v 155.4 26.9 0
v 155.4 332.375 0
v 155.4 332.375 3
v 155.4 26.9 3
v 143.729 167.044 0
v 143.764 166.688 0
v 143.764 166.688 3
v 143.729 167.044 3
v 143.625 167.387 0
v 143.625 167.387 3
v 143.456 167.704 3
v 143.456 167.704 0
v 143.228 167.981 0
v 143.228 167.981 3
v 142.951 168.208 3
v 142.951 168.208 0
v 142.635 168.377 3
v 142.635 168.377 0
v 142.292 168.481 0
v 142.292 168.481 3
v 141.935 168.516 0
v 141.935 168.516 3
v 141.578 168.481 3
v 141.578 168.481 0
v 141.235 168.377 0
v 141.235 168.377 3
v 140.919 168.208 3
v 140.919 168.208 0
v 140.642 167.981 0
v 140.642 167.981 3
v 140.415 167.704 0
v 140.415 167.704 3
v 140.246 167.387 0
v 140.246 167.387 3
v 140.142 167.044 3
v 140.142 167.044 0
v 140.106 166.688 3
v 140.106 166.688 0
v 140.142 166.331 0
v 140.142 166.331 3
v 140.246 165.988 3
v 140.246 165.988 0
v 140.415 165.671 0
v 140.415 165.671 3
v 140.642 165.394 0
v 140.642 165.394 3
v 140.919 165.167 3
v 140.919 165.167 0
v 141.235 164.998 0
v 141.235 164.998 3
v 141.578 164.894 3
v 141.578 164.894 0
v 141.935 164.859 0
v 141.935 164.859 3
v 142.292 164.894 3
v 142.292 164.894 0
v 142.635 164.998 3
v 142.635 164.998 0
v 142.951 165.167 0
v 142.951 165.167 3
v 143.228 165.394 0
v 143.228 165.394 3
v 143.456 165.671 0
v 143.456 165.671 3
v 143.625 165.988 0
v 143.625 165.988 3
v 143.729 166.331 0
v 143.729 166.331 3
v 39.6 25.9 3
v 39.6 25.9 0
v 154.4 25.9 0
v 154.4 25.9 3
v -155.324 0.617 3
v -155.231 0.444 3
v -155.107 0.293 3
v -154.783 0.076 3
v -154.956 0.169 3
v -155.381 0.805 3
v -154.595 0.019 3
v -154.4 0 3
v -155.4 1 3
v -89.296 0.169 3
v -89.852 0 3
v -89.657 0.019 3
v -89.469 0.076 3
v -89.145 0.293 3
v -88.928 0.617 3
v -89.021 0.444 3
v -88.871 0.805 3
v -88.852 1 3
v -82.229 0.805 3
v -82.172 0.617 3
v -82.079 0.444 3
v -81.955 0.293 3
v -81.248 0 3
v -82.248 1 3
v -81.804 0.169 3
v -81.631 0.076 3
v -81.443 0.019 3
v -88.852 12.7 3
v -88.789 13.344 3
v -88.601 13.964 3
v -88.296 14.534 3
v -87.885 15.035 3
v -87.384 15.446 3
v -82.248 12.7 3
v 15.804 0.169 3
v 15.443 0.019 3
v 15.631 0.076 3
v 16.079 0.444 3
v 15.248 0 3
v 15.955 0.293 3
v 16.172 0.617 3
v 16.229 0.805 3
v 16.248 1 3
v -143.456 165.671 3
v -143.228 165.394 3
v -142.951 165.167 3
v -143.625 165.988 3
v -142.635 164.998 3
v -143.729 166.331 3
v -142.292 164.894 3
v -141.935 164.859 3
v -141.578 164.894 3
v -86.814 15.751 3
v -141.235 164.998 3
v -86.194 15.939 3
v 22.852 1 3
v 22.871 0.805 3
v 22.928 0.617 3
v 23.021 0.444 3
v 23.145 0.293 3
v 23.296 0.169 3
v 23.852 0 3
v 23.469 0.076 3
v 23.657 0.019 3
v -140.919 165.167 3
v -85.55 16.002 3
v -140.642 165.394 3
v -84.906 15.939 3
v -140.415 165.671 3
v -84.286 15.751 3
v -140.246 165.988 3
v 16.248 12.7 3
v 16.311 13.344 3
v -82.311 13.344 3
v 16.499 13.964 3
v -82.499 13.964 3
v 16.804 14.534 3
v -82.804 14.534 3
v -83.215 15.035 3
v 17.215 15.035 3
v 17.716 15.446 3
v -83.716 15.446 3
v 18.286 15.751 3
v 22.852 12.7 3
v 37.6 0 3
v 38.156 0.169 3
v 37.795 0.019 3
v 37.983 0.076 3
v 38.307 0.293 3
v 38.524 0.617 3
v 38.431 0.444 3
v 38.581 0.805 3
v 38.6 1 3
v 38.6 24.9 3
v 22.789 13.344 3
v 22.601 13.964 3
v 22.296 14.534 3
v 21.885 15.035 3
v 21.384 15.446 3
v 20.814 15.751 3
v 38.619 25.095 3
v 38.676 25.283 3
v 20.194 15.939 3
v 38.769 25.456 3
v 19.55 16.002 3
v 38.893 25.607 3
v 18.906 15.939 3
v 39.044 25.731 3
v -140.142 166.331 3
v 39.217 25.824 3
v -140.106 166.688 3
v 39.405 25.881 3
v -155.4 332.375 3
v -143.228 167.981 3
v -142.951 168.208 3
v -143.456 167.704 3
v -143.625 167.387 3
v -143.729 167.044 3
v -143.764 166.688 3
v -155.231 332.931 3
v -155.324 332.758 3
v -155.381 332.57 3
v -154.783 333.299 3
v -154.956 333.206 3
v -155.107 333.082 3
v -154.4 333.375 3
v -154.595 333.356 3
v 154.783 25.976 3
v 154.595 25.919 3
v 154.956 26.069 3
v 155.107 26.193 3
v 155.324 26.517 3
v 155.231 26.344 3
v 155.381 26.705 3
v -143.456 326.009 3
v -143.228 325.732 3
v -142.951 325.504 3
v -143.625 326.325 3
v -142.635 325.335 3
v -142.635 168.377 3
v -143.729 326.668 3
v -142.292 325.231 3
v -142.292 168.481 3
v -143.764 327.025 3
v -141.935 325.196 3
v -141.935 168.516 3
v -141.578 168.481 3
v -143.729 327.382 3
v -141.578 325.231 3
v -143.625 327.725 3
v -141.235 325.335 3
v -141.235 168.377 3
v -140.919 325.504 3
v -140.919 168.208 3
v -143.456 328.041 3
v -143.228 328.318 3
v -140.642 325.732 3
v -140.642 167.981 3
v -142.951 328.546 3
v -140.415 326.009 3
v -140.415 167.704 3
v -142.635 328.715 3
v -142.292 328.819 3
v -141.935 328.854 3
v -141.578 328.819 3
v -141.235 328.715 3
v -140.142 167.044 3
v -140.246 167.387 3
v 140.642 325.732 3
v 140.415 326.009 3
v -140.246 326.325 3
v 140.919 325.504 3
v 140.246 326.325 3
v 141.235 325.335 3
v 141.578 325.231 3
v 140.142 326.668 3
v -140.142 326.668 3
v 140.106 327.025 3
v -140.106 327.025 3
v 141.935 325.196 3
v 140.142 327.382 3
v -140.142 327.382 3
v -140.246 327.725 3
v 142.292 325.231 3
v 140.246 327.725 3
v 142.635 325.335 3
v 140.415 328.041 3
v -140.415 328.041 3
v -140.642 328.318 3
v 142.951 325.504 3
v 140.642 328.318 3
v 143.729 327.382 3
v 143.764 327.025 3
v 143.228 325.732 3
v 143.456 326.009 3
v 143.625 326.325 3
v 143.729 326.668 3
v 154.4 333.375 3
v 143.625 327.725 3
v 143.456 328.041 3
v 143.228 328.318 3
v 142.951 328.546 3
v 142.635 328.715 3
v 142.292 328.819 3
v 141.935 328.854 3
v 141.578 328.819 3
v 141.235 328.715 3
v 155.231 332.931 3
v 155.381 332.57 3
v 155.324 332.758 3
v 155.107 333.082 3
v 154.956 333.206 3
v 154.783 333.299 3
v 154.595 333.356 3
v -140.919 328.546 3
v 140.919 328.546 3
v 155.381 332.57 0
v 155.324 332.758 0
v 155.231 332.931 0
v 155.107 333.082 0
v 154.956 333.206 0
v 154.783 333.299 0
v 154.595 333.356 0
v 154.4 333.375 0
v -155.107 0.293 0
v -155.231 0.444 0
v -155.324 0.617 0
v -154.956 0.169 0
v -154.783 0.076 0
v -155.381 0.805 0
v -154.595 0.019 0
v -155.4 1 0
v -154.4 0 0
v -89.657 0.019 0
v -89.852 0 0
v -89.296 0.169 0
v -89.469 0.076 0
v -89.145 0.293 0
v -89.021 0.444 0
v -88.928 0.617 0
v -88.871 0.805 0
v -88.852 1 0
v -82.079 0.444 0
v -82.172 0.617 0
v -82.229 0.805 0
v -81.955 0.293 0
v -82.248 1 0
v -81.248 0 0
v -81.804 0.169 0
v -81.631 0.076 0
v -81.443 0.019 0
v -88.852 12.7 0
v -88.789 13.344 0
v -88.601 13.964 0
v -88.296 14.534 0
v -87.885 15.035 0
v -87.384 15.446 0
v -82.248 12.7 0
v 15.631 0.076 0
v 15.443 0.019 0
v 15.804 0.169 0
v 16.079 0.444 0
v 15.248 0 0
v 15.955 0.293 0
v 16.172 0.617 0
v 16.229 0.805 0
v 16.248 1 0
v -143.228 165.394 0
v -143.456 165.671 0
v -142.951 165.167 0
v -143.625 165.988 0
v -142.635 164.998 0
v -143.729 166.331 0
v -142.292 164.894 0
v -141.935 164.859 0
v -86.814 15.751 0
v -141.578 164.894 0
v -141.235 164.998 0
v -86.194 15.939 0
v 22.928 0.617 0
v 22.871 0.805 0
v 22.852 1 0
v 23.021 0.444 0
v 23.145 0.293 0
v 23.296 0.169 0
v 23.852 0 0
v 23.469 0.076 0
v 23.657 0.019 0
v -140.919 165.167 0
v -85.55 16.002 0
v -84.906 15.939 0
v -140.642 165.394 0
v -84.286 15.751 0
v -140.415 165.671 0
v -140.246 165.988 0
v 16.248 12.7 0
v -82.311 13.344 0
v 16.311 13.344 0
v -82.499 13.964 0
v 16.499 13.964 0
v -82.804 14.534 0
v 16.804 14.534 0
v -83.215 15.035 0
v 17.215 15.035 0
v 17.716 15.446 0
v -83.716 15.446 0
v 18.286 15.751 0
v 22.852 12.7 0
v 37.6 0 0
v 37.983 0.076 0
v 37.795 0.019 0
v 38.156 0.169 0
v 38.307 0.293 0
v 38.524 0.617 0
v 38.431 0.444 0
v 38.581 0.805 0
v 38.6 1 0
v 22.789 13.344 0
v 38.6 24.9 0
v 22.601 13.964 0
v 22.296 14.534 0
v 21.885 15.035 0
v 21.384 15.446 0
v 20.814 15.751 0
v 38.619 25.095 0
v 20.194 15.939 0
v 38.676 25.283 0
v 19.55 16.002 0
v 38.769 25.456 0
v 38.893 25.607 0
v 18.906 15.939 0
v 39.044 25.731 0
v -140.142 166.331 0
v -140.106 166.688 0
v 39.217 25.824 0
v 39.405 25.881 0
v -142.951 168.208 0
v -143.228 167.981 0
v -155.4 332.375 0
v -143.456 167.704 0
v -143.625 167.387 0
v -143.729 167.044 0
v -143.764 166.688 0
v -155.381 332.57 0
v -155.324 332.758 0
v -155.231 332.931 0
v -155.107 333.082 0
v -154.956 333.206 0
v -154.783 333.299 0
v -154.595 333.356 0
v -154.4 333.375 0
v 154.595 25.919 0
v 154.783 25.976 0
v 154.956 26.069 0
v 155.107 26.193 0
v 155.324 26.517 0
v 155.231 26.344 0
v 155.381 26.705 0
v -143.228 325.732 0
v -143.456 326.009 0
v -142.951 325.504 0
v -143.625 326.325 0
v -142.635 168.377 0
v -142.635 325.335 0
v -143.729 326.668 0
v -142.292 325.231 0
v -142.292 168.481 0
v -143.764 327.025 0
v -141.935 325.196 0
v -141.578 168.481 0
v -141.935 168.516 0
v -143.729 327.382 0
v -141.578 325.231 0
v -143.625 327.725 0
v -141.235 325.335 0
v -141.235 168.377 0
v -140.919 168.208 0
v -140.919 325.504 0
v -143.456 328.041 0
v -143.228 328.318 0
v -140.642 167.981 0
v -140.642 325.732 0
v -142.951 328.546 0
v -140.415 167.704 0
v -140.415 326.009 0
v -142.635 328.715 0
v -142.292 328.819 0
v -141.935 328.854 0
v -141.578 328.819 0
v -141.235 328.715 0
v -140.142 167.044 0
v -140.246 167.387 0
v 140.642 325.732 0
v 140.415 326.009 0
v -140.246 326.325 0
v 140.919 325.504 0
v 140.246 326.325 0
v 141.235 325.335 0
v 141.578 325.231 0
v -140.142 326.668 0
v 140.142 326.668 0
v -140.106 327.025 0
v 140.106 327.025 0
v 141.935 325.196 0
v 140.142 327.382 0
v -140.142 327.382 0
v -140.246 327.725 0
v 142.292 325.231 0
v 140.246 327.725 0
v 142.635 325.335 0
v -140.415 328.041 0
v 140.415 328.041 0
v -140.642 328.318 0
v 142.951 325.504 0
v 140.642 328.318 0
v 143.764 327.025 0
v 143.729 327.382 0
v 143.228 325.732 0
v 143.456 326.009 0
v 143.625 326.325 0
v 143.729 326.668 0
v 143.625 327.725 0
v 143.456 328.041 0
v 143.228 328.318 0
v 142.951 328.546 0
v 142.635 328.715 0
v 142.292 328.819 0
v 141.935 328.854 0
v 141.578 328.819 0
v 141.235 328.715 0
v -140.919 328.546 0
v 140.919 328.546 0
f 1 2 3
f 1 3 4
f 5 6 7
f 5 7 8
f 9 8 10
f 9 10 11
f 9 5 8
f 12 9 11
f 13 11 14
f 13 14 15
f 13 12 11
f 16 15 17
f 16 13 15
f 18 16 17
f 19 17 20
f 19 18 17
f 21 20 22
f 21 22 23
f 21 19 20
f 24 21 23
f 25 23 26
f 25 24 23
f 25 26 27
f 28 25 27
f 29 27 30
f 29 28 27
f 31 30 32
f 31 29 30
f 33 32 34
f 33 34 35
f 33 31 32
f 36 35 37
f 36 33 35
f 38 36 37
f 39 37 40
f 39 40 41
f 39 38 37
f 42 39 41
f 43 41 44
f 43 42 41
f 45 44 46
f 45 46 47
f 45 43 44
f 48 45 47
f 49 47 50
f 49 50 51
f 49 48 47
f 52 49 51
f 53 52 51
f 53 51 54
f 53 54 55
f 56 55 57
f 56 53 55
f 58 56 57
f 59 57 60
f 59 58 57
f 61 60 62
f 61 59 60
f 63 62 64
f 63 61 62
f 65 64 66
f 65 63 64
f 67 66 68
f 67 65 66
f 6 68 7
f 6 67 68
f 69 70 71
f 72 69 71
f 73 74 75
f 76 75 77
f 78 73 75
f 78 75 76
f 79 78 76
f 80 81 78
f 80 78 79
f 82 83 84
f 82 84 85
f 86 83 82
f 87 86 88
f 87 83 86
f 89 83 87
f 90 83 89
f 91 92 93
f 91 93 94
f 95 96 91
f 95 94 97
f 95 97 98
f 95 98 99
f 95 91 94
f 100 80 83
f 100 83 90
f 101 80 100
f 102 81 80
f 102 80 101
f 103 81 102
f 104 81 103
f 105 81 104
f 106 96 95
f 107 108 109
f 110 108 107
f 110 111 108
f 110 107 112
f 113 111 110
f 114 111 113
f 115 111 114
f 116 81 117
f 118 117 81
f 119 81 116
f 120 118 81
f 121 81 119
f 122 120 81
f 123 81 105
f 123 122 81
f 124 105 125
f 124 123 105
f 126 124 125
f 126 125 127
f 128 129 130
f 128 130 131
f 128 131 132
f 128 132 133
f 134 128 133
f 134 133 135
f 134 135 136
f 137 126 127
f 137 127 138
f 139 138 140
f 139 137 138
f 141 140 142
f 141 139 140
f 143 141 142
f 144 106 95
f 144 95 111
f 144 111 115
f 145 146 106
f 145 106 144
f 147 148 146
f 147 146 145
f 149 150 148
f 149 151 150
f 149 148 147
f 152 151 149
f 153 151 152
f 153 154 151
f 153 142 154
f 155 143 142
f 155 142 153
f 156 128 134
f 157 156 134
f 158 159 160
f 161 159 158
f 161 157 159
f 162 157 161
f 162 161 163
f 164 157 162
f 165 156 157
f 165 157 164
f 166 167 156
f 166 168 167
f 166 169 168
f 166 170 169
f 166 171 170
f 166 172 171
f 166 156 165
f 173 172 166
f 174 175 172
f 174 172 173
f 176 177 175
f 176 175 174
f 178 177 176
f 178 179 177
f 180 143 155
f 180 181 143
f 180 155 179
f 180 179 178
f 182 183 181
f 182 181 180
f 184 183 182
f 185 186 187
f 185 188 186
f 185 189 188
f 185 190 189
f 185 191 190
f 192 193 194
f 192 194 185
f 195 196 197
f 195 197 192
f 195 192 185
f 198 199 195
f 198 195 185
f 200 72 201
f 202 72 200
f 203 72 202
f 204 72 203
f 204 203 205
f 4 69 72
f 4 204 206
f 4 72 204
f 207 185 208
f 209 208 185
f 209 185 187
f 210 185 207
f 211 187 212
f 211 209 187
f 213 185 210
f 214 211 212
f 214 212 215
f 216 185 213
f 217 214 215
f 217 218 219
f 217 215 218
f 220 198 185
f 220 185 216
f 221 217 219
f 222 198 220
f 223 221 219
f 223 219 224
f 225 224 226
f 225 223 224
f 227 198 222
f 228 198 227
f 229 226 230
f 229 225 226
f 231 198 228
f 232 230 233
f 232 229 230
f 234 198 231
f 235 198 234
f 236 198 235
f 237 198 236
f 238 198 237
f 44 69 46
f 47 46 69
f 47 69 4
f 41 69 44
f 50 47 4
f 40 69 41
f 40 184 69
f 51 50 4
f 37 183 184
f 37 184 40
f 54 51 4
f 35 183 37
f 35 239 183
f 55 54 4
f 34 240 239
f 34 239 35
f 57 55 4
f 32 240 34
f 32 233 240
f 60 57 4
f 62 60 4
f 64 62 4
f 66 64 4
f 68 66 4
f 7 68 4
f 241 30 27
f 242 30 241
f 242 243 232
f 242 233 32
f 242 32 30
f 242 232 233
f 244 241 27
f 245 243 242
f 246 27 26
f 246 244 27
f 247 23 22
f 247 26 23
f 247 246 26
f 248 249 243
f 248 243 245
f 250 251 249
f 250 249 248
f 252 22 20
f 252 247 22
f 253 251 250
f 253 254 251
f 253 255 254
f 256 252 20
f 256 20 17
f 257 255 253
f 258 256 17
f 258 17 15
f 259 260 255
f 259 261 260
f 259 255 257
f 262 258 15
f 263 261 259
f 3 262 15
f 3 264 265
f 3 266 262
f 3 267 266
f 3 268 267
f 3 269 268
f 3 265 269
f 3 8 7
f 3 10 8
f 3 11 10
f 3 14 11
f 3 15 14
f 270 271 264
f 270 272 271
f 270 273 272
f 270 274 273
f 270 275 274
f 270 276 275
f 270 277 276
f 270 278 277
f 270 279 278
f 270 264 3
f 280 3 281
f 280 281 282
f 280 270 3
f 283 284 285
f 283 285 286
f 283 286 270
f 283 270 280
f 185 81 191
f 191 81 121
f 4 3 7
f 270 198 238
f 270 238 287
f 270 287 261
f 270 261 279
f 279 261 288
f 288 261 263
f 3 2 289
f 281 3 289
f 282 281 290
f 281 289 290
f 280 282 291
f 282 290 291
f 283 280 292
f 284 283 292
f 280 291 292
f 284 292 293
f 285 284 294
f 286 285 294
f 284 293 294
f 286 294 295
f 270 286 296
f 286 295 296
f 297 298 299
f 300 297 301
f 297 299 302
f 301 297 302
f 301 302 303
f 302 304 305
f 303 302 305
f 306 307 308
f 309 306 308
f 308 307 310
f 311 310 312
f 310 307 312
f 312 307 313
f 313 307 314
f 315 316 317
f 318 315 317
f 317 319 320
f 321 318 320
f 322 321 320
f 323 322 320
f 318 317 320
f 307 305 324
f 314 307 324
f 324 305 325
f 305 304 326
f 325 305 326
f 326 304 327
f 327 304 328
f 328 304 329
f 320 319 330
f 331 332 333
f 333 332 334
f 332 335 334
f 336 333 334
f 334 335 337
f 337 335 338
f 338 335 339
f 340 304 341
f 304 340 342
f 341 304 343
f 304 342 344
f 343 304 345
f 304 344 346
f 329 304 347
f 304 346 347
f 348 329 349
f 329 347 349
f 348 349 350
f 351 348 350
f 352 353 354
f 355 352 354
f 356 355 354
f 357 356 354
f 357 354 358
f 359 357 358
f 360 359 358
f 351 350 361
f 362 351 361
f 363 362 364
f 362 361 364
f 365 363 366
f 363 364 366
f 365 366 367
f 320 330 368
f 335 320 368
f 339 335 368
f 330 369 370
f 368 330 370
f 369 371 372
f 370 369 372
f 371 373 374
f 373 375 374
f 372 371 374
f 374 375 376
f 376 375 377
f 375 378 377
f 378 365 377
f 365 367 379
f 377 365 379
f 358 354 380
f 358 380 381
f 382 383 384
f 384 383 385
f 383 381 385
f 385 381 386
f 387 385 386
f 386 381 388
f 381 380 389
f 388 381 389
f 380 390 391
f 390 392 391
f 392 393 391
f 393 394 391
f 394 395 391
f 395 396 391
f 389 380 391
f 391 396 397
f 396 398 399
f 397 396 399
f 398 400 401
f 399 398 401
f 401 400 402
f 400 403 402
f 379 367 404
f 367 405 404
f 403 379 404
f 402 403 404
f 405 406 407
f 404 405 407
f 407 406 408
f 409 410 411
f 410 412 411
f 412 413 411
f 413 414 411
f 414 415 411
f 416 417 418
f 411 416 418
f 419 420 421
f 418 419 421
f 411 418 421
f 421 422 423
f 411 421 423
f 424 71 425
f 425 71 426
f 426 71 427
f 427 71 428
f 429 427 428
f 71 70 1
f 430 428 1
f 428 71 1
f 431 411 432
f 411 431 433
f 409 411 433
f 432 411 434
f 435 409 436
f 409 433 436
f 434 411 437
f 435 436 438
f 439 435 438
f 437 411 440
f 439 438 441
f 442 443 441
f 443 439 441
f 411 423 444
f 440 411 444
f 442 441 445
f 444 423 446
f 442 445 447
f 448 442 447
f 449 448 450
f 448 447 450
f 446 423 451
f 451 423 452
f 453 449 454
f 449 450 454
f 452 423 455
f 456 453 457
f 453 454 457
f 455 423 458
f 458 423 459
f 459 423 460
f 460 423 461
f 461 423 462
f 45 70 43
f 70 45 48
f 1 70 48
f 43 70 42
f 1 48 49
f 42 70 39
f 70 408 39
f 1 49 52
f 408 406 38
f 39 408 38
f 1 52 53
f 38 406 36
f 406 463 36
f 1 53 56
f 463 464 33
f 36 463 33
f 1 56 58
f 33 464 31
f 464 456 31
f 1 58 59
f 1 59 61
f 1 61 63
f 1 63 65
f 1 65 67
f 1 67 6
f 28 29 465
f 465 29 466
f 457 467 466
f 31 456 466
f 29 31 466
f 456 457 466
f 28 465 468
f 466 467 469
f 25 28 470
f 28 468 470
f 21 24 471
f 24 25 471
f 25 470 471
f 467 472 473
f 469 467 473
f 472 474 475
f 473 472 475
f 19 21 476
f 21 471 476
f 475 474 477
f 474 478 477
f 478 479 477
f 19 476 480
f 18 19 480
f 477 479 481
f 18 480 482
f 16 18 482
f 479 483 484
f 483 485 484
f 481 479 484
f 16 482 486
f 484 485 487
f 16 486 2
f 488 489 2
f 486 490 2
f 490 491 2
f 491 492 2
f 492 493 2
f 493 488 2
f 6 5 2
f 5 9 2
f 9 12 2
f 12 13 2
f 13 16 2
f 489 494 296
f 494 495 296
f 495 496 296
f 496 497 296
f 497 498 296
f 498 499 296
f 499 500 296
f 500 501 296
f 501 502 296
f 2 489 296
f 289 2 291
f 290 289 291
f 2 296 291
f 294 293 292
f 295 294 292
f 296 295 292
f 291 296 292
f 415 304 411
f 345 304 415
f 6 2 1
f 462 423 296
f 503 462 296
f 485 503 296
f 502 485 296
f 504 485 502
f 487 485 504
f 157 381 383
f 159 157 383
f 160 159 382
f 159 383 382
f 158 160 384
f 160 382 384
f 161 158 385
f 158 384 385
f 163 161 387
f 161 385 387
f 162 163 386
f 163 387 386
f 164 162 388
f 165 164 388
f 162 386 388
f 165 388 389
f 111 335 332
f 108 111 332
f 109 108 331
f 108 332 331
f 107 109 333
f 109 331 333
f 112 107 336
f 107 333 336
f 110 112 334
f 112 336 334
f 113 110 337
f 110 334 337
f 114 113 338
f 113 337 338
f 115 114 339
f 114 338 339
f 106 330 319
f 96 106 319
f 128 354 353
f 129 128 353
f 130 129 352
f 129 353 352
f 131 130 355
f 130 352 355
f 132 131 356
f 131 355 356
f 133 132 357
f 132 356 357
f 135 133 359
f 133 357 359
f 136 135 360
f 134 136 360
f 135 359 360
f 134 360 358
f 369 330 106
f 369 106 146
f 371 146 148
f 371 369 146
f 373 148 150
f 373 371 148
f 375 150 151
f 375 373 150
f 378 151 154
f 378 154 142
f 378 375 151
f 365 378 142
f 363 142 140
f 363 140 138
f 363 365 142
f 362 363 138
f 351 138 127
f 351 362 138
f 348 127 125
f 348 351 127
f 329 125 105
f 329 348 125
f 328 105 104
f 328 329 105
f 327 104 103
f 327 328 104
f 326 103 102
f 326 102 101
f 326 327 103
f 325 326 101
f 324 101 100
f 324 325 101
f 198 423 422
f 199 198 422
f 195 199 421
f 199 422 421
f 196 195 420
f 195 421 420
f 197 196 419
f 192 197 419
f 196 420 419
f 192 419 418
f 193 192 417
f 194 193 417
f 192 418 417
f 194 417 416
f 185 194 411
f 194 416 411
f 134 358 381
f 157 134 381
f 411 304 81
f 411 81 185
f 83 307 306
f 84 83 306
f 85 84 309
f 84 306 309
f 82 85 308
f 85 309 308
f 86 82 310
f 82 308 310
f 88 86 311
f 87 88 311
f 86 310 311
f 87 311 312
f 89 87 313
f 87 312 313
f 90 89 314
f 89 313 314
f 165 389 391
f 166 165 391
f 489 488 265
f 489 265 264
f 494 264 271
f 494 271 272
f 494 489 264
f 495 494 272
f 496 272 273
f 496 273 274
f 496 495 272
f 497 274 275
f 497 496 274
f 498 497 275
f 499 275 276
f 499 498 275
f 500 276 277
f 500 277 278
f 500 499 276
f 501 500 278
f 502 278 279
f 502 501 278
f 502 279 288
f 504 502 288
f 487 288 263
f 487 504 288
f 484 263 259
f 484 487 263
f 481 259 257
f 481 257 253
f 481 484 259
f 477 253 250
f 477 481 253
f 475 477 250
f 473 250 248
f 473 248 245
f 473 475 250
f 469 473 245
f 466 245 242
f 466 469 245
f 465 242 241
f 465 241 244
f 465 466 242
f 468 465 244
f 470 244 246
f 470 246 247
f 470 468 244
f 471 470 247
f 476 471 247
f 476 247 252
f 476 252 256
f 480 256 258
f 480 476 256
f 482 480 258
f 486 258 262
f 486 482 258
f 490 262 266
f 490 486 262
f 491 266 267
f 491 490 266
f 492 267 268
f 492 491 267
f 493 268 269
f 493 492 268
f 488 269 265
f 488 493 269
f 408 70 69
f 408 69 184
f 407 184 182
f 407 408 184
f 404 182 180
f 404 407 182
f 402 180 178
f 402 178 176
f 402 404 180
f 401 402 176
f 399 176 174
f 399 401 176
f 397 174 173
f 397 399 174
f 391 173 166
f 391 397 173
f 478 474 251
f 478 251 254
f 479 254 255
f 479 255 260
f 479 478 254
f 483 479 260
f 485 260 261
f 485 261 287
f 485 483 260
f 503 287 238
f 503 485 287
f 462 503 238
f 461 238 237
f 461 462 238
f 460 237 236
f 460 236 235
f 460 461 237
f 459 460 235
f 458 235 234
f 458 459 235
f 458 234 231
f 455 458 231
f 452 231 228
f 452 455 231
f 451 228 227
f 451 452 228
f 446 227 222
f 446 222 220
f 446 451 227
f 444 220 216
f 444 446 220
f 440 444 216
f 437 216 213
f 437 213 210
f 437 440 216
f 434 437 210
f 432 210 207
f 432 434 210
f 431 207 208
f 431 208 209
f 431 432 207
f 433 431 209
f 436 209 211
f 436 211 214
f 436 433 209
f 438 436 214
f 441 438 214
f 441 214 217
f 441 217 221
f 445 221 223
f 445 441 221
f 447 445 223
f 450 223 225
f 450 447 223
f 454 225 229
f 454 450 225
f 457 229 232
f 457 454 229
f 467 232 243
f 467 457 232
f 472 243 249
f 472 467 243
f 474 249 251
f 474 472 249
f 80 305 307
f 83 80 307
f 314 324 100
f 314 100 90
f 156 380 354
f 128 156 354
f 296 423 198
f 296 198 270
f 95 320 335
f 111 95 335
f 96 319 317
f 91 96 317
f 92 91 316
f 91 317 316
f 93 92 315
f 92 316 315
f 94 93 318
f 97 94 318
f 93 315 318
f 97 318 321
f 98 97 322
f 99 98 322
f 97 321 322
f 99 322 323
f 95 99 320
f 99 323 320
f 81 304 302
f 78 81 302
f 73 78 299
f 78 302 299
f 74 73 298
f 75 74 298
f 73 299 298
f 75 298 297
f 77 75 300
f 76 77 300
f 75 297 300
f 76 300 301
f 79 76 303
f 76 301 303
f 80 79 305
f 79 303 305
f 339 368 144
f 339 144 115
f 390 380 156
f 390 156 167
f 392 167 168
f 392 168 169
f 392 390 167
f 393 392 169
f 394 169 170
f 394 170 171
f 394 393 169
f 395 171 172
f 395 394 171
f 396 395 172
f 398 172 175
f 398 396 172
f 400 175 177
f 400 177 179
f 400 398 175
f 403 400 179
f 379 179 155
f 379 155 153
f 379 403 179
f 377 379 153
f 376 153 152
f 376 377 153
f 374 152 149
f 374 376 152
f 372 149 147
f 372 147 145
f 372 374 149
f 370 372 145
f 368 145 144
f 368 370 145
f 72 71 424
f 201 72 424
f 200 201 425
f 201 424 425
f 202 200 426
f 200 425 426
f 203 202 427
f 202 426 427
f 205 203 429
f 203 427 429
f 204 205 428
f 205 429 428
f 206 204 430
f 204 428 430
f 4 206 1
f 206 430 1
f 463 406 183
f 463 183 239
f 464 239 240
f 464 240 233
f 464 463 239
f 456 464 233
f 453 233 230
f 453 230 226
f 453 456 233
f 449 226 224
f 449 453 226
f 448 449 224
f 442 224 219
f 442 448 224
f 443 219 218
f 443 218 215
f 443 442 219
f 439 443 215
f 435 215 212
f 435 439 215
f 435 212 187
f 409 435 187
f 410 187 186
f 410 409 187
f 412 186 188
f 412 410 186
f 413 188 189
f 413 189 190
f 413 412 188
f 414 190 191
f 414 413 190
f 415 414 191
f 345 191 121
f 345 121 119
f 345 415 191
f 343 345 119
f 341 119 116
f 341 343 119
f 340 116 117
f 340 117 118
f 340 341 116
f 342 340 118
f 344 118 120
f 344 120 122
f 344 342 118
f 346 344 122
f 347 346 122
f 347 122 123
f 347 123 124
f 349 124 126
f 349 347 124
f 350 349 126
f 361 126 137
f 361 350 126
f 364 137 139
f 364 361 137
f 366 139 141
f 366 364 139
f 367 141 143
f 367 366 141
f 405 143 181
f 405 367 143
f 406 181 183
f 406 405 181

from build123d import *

# Parameters (mm, degrees)
SKETCH_R  = 1.8288
PAD_DEPTH = 3


with BuildPart() as part:
    # Sketch → Pad (new body)
    with BuildSketch(Plane.XY):
        with BuildLine():
            ThreePointArc((-154.4, 333.375), (-155.107107, 333.082107), (-155.4, 332.375))
            Line((-155.4, 1), (-155.4, 332.375))
            ThreePointArc((-155.4, 1), (-155.107107, 0.292893), (-154.4, 0))
            Line((-154.4, 0), (-89.852, 0))
            ThreePointArc((-89.852, 0), (-89.144893, 0.292893), (-88.852, 1))
            Line((-88.852, 12.7), (-88.852, 1))
            ThreePointArc((-82.248, 12.7), (-85.55, 16.002), (-88.852, 12.7))
            Line((-82.248, 12.7), (-82.248, 1))
            ThreePointArc((-82.248, 1), (-81.955107, 0.292893), (-81.248, 0))
            Line((-81.248, 0), (15.248, 0))
            ThreePointArc((15.248, 0), (15.955107, 0.292893), (16.248, 1))
            Line((16.248, 12.7), (16.248, 1))
            ThreePointArc((22.852, 12.7), (19.55, 16.002), (16.248, 12.7))
            Line((22.852, 12.7), (22.852, 1))
            ThreePointArc((22.852, 1), (23.144893, 0.292893), (23.852, 0))
            Line((23.852, 0), (37.6, 0))
            ThreePointArc((37.6, 0), (38.307107, 0.292893), (38.6, 1))
            Line((38.6, 1), (38.6, 24.9))
            ThreePointArc((39.6, 25.9), (38.892893, 25.607107), (38.6, 24.9))
            Line((39.6, 25.9), (154.4, 25.9))
            ThreePointArc((154.4, 25.9), (155.107107, 26.192893), (155.4, 26.9))
            Line((155.4, 332.375), (155.4, 26.9))
            ThreePointArc((155.4, 332.375), (155.107107, 333.082107), (154.4, 333.375))
            Line((-154.4, 333.375), (154.4, 333.375))
        make_face()
        with Locations((-141.9352, 327.025)):
            Circle(SKETCH_R, mode=Mode.SUBTRACT)
        with Locations((-141.9352, 166.6875)):
            Circle(SKETCH_R, mode=Mode.SUBTRACT)
        with Locations((141.9352, 327.025)):
            Circle(SKETCH_R, mode=Mode.SUBTRACT)
        with Locations((141.9352, 166.6875)):
            Circle(SKETCH_R, mode=Mode.SUBTRACT)
    extrude(amount=PAD_DEPTH)


solid = part.part
